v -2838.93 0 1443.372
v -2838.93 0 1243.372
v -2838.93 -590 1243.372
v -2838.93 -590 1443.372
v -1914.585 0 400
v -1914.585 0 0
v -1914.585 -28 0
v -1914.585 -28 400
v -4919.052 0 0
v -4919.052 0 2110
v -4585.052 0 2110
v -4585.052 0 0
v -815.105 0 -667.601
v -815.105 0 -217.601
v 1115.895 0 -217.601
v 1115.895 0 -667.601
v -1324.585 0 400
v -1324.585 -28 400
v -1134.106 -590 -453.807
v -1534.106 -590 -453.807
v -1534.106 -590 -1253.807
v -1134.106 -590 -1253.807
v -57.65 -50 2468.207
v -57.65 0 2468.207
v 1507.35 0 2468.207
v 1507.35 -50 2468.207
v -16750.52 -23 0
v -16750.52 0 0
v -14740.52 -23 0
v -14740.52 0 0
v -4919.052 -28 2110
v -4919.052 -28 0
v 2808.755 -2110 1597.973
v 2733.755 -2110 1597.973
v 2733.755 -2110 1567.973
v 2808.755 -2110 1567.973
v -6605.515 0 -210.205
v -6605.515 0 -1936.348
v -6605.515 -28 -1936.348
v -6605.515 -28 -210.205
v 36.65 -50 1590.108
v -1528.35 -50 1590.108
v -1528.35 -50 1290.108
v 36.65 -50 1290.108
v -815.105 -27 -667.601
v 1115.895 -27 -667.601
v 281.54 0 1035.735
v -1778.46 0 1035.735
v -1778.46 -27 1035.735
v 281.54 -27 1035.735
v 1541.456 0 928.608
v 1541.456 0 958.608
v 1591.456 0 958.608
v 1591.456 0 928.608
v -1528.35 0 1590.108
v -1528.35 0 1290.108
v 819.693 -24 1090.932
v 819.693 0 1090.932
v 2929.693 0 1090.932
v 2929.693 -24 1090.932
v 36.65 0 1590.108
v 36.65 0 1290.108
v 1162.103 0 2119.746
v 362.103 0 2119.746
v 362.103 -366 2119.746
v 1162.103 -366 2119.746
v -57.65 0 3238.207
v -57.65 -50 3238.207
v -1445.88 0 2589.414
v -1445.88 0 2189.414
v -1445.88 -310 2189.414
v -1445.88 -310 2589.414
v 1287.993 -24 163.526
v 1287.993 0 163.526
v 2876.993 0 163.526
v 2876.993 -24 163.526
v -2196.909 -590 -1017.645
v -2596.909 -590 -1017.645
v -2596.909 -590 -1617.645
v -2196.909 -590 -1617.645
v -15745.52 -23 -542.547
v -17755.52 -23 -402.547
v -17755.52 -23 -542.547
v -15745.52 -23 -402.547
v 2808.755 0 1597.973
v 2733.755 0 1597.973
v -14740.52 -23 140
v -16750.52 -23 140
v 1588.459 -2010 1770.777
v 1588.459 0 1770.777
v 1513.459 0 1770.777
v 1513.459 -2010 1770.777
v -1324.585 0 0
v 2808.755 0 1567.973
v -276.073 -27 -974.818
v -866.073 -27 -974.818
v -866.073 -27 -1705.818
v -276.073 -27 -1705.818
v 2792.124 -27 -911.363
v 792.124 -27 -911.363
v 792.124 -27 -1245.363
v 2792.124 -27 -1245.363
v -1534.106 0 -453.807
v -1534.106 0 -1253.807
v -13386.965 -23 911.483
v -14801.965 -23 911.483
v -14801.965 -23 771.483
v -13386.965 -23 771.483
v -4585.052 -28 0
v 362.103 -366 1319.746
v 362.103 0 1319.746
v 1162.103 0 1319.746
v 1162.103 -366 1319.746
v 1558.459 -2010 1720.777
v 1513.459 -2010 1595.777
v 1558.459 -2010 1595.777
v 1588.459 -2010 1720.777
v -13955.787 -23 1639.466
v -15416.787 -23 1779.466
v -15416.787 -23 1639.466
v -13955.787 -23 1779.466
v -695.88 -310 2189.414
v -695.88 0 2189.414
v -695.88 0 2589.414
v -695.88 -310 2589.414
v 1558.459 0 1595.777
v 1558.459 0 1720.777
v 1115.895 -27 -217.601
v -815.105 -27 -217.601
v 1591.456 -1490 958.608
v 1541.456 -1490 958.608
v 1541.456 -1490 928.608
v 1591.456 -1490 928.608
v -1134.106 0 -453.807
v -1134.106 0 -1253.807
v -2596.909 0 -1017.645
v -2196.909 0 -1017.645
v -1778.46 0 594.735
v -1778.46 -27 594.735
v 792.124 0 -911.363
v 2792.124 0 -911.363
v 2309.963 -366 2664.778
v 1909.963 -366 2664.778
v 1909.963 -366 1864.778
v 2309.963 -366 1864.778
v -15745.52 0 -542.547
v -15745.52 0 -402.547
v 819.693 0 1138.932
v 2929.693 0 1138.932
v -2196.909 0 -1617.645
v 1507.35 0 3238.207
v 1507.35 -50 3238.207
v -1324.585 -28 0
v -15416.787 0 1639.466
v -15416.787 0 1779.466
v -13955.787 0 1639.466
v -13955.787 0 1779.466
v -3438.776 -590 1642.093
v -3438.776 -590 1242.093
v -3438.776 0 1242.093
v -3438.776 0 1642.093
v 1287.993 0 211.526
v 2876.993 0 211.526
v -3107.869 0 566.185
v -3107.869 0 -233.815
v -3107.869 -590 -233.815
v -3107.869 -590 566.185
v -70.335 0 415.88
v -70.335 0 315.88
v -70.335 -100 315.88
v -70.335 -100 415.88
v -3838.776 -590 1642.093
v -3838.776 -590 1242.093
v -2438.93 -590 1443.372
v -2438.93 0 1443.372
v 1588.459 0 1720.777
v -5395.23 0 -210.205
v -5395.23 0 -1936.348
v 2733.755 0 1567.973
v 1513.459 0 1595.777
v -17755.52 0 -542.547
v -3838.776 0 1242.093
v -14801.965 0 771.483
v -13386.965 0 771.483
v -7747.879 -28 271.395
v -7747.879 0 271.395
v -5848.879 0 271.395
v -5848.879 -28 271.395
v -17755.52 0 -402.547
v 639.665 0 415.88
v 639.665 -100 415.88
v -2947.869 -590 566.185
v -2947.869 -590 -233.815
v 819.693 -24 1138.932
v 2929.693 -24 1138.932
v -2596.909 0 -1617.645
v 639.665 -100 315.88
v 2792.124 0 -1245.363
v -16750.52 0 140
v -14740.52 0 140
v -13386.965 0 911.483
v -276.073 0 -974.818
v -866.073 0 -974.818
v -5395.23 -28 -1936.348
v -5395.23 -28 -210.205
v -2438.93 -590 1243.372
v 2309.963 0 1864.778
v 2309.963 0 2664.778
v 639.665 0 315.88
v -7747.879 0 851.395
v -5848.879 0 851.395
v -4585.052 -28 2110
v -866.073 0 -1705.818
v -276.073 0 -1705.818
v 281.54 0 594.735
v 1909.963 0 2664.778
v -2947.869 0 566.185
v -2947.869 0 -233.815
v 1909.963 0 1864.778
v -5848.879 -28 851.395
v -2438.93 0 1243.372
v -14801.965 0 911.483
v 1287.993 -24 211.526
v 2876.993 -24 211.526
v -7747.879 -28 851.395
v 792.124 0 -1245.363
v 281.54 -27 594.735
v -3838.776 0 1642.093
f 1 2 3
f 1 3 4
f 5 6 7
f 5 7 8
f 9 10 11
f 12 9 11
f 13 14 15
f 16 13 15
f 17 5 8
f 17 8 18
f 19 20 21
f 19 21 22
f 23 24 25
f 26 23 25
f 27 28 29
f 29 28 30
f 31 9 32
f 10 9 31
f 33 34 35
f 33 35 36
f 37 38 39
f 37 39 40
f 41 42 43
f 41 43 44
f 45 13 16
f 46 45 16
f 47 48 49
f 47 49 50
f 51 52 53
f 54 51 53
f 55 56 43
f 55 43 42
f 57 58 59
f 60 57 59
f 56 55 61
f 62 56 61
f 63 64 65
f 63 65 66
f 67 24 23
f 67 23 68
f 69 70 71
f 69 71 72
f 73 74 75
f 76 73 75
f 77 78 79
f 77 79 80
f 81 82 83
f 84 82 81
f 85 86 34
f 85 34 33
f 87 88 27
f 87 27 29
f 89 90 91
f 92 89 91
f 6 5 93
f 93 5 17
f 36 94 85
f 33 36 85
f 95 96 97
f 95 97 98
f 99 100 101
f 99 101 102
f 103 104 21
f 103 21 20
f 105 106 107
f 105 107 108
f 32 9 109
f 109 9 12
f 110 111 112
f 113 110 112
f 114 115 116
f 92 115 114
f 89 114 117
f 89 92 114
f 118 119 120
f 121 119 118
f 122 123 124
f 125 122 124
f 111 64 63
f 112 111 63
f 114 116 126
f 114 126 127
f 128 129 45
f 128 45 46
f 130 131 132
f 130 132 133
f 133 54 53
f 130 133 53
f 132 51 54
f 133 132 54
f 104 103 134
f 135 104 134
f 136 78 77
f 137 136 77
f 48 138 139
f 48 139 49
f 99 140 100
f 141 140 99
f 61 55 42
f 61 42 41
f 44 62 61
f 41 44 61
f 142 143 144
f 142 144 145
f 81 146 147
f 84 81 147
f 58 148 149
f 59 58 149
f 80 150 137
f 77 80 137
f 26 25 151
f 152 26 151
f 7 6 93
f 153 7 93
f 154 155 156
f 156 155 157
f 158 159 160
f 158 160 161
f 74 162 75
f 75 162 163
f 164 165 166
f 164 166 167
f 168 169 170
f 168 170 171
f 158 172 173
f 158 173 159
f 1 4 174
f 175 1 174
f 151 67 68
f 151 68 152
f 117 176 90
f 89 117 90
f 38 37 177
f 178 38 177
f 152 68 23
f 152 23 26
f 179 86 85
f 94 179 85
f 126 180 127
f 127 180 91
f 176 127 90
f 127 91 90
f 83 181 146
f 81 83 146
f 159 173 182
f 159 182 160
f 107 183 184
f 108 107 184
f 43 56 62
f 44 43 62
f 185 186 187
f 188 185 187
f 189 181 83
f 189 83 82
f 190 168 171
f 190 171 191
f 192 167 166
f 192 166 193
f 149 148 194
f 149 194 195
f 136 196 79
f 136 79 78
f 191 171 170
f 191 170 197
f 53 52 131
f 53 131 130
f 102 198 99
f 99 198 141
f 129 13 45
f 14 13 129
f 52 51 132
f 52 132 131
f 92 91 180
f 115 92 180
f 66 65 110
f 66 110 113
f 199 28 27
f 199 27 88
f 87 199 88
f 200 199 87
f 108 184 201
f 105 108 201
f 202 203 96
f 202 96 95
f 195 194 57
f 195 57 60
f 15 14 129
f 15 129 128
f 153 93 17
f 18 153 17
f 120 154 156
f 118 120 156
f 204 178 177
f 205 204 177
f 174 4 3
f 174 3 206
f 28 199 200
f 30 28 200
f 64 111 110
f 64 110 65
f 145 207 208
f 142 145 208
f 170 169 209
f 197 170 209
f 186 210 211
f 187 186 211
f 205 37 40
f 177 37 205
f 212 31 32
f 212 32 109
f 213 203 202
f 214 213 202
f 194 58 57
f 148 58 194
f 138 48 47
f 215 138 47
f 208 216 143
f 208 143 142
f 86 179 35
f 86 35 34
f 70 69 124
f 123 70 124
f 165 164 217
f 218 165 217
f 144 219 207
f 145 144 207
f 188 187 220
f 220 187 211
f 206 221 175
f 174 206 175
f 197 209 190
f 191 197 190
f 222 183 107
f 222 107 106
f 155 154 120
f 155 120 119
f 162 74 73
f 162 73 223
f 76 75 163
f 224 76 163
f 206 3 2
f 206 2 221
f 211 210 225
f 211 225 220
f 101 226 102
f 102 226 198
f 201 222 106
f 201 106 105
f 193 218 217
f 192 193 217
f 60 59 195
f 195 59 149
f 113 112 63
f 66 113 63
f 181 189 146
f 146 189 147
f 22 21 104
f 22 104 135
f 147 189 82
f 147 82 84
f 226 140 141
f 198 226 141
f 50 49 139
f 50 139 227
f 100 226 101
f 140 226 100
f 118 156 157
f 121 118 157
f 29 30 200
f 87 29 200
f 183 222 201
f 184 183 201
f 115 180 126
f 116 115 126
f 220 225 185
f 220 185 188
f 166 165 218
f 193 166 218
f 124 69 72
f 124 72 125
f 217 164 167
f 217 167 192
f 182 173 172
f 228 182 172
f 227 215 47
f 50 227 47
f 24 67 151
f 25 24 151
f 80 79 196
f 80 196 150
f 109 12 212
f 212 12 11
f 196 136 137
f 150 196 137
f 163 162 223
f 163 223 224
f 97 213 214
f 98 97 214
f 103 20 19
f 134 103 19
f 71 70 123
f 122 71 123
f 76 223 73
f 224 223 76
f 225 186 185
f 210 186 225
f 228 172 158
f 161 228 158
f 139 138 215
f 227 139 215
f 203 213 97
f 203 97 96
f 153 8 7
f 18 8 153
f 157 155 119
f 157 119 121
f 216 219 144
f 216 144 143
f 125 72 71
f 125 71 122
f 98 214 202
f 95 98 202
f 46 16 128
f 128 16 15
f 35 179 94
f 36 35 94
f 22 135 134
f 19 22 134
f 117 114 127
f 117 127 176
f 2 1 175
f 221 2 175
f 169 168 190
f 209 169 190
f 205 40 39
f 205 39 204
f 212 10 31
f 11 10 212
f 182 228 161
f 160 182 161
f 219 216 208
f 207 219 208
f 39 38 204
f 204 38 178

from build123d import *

# Parameters (mm, degrees)
F0_W      = 710
F0_H      = 100
F1_DEPTH  = 100
F2_W      = 2000
F2_H      = 334
F3_DEPTH  = 27
F4_W      = 1565
F4_H      = 770
F4_H_2    = 300
F5_DEPTH  = 50
F7_DEPTH  = 2010
F8_W      = 2110
F8_H      = 48
F9_DEPTH  = 24
F10_W     = 1589
F10_H     = 48
F11_DEPTH = 24
F12_W     = 1899
F12_H     = 580
F12_W_2   = 334
F12_H_2   = 2110
F12_W_3   = 1210.284843
F12_H_3   = 1726.143237
F13_DEPTH = 28
F14_W     = 800
F14_H     = 800
F15_DEPTH = 366
F16_W     = 400
F16_H     = 800
F17_DEPTH = 366
F18_W     = 750
F18_H     = 400
F19_DEPTH = 310
F20_W     = 75
F20_H     = 30
F21_DEPTH = 2110
F22_W     = 400
F22_H     = 200
F22_H_2   = 400
F23_DEPTH = 590
F24_W     = 400
F24_H     = 600
F25_DEPTH = 590
F26_W     = 590
F26_H     = 400
F27_DEPTH = 28
F28_W     = 160
F28_H     = 800
F29_DEPTH = 590
F30_W     = 400
F30_H     = 800
F31_DEPTH = 590
F32_W     = 2060
F32_H     = 441
F32_W_2   = 1931
F32_H_2   = 450
F32_W_3   = 590
F32_H_3   = 731
F33_DEPTH = 27
F34_W     = 50
F34_H     = 30
F35_DEPTH = 1490
F36_W     = 1415
F36_H     = 140
F36_W_2   = 2010
F36_W_3   = 1461
F37_DEPTH = 23


with BuildPart() as f1:
    # F0 (on Front) → F1 (new body)
    with BuildSketch(Plane.XZ):
        with Locations((284.664744, 365.880244)):
            Rectangle(F0_W, F0_H)
    extrude(amount=F1_DEPTH)


with BuildPart() as f3:
    # F2 (on Front) → F3 (new body)
    with BuildSketch(Plane.XZ):
        with Locations((1792.124271, -1078.362907)):
            Rectangle(F2_W, F2_H)
    extrude(amount=F3_DEPTH)


with BuildPart() as f5:
    # F4 (on Front) → F5 (new body)
    with BuildSketch(Plane.XZ):
        with Locations((724.849694, 2853.207262)):
            Rectangle(F4_W, F4_H)
        with Locations((-745.849795, 1440.107686)):
            Rectangle(F4_W, F4_H_2)
    extrude(amount=F5_DEPTH)


with BuildPart() as f7:
    # F6 (on Front) → F7 (new body)
    with BuildSketch(Plane.XZ):
        Polygon((1513.458872, 1595.77716), (1558.458872, 1595.77716), (1558.458872, 1720.77716), (1588.458872, 1720.77716), (1588.458872, 1770.77716), (1513.458872, 1770.77716), align=None)
    extrude(amount=F7_DEPTH)


with BuildPart() as f9:
    # F8 (on Front) → F9 (new body)
    with BuildSketch(Plane.XZ):
        with Locations((1874.693036, 1114.932496)):
            Rectangle(F8_W, F8_H)
    extrude(amount=F9_DEPTH)


with BuildPart() as f11:
    # F10 (on Front) → F11 (new body)
    with BuildSketch(Plane.XZ):
        with Locations((2082.493305, 187.526129)):
            Rectangle(F10_W, F10_H)
    extrude(amount=F11_DEPTH)


with BuildPart() as f13:
    # F12 (on Front) → F13 (new body)
    with BuildSketch(Plane.XZ):
        with Locations((-6798.378944, 561.394877)):
            Rectangle(F12_W, F12_H)
        with Locations((-4752.052484, 1055)):
            Rectangle(F12_W_2, F12_H_2)
        with Locations((-6000.372431, -1073.276282)):
            Rectangle(F12_W_3, F12_H_3)
    extrude(amount=F13_DEPTH)


with BuildPart() as f15:
    # F14 (on Front) → F15 (new body)
    with BuildSketch(Plane.XZ):
        with Locations((762.103327, 1719.746114)):
            Rectangle(F14_W, F14_H)
    extrude(amount=F15_DEPTH)


with BuildPart() as f17:
    # F16 (on Front) → F17 (new body)
    with BuildSketch(Plane.XZ):
        with Locations((2109.963225, 2264.778495)):
            Rectangle(F16_W, F16_H)
    extrude(amount=F17_DEPTH)


with BuildPart() as f19:
    # F18 (on Front) → F19 (new body)
    with BuildSketch(Plane.XZ):
        with Locations((-1070.879757, 2389.413956)):
            Rectangle(F18_W, F18_H)
    extrude(amount=F19_DEPTH)


with BuildPart() as f21:
    # F20 (on Front) → F21 (new body)
    with BuildSketch(Plane.XZ):
        with Locations((2771.255136, 1582.972825)):
            Rectangle(F20_W, F20_H)
    extrude(amount=F21_DEPTH)


with BuildPart() as f23:
    # F22 (on Front) → F23 (new body)
    with BuildSketch(Plane.XZ):
        with Locations((-2638.930207, 1343.371749)):
            Rectangle(F22_W, F22_H)
        with Locations((-3638.775873, 1442.092967)):
            Rectangle(F22_W, F22_H_2)
    extrude(amount=F23_DEPTH)


with BuildPart() as f25:
    # F24 (on Front) → F25 (new body)
    with BuildSketch(Plane.XZ):
        with Locations((-2396.908727, -1317.645407)):
            Rectangle(F24_W, F24_H)
    extrude(amount=F25_DEPTH)


with BuildPart() as f27:
    # F26 (on Front) → F27 (new body)
    with BuildSketch(Plane.XZ):
        with Locations((-1619.585202, 200)):
            Rectangle(F26_W, F26_H)
    extrude(amount=F27_DEPTH)


with BuildPart() as f29:
    # F28 (on Front) → F29 (new body)
    with BuildSketch(Plane.XZ):
        with Locations((-3027.869124, 166.185106)):
            Rectangle(F28_W, F28_H)
    extrude(amount=F29_DEPTH)


with BuildPart() as f31:
    # F30 (on Front) → F31 (new body)
    with BuildSketch(Plane.XZ):
        with Locations((-1334.106386, -853.806677)):
            Rectangle(F30_W, F30_H)
    extrude(amount=F31_DEPTH)


with BuildPart() as f33:
    # F32 (on Front) → F33 (new body)
    with BuildSketch(Plane.XZ):
        with Locations((-748.460316, 815.234985)):
            Rectangle(F32_W, F32_H)
        with Locations((150.395396, -442.6007)):
            Rectangle(F32_W_2, F32_H_2)
        with Locations((-571.072953, -1340.318295)):
            Rectangle(F32_W_3, F32_H_3)
    extrude(amount=F33_DEPTH)


with BuildPart() as f35:
    # F34 (on Front) → F35 (new body)
    with BuildSketch(Plane.XZ):
        with Locations((1566.456125, 943.608493)):
            Rectangle(F34_W, F34_H)
    extrude(amount=F35_DEPTH)


with BuildPart() as f37:
    # F36 (on Front) → F37 (new body)
    with BuildSketch(Plane.XZ):
        with Locations((-14094.46476, 841.482944)):
            Rectangle(F36_W, F36_H)
        with Locations((-15745.519867, 70)):
            Rectangle(F36_W_2, F36_H)
        with Locations((-14686.287148, 1709.466286)):
            Rectangle(F36_W_3, F36_H)
        with Locations((-16750.519867, -472.547286)):
            Rectangle(F36_W_2, F36_H)
    extrude(amount=F37_DEPTH)


solid = Compound([f1.part, f3.part, f5.part, f7.part, f9.part, f11.part, f13.part, f15.part, f17.part, f19.part, f21.part, f23.part, f25.part, f27.part, f29.part, f31.part, f33.part, f35.part, f37.part])
